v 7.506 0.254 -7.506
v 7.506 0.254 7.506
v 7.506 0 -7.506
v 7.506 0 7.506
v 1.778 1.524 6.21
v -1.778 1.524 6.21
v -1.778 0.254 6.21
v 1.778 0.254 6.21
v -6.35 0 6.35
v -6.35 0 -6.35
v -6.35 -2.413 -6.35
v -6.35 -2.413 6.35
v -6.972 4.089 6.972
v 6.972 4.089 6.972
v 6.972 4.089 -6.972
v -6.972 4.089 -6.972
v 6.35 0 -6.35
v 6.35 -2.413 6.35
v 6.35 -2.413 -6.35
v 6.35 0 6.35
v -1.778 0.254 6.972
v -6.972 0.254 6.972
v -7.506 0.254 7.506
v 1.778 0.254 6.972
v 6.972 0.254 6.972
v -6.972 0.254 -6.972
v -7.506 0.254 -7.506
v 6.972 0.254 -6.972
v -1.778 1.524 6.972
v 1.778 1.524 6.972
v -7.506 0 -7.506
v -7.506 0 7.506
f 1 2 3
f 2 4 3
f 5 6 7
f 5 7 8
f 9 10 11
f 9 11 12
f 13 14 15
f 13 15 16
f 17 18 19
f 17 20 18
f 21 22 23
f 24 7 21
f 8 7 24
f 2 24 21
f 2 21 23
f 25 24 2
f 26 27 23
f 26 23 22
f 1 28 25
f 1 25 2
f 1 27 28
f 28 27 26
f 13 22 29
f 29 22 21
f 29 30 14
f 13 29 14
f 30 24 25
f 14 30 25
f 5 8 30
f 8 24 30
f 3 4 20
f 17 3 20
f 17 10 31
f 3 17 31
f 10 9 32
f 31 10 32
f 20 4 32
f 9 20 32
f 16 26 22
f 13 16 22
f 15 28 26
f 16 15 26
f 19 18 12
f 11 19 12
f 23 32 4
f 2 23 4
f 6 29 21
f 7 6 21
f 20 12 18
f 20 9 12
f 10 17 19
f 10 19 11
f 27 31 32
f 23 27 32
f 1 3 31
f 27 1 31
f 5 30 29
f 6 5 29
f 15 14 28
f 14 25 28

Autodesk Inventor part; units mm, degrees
sketch "Sketch_1" plane through (0, 0, 0) normal (0, 1, 0) x (-1, 0, 0)
  line L0 (7.5057, 7.5057) -> (-7.5057, 7.5057)
  line L1 (-7.5057, 7.5057) -> (-7.5057, -7.5057)
  line L2 (-7.5057, -7.5057) -> (7.5057, -7.5057)
  line L3 (7.5057, -7.5057) -> (7.5057, 7.5057)
extrude "Extrusion1" add sketch "Sketch_1" along normal blind 4.0894
sketch "Sketch_2" plane through (0, 0.254, 0) normal (0, 1, 0) x (1, 0, 0)
  line L0 (-7.62, -7.62) -> (7.62, -7.62)
  line L1 (7.62, -7.62) -> (7.62, 7.62)
  line L2 (7.62, 7.62) -> (-7.62, 7.62)
  line L3 (-7.62, 7.62) -> (-7.62, -7.62)
  line L4 (-6.9723, -6.9723) -> (6.9723, -6.9723)
  line L5 (6.9723, -6.9723) -> (6.9723, 6.9723)
  line L6 (6.9723, 6.9723) -> (-6.9723, 6.9723)
  line L7 (-6.9723, 6.9723) -> (-6.9723, -6.9723)
extrude "Extrusion2" cut sketch "Sketch_2" along normal blind 6.35
sketch "Sketch_4" plane through (0, 0, 6.9723) normal (0, 0, 1) x (1, 0, 0)
  line L0 (-1.778, 0.254) -> (1.778, 0.254)
  line L1 (1.778, 0.254) -> (1.778, 1.524)
  line L2 (1.778, 1.524) -> (-1.778, 1.524)
  line L3 (-1.778, 1.524) -> (-1.778, 0.254)
extrude "Extrusion3" cut sketch "Sketch_4" against normal blind 0.762
sketch "Sketch_6" plane through (0, 0, 0) normal (0, 1, 0) x (-1, 0, 0)
  line L0 (6.35, 6.35) -> (-6.35, 6.35)
  line L1 (-6.35, 6.35) -> (-6.35, -6.35)
  line L2 (-6.35, -6.35) -> (6.35, -6.35)
  line L3 (6.35, -6.35) -> (6.35, 6.35)
extrude "Extrusion4" add sketch "Sketch_6" against normal blind 2.413
ref_plane "diffuser_to_body_XY" through (0, 0, 0) normal (0, 1, 0) x (1, 0, 0)
ref_plane "diffuser_to_body_YZ" through (0, 0, 0) normal (1, 0, 0) x (0, 0, -1)
ref_plane "diffuser_to_body_ZX" through (0, 0, 0) normal (0, 0, -1) x (0, 1, 0)
ref_plane "diffuser_to_body_green_XY" through (3.7529, 0, 0) normal (0, 1, 0) x (1, 0, 0)
ref_plane "diffuser_to_body_green_YZ" through (3.7529, 0, 0) normal (1, 0, 0) x (0, 0, -1)
ref_plane "diffuser_to_body_green_ZX" through (3.7529, 0, 0) normal (0, 0, -1) x (0, 1, 0)
ref_plane "diffuser_to_body_red_XY" through (-3.7529, 0, 0) normal (0, 1, 0) x (1, 0, 0)
ref_plane "diffuser_to_body_red_YZ" through (-3.7529, 0, 0) normal (1, 0, 0) x (0, 0, -1)
ref_plane "diffuser_to_body_red_ZX" through (-3.7529, 0, 0) normal (0, 0, -1) x (0, 1, 0)
properties part number "UB216SKG035D-1JBd_cap"
